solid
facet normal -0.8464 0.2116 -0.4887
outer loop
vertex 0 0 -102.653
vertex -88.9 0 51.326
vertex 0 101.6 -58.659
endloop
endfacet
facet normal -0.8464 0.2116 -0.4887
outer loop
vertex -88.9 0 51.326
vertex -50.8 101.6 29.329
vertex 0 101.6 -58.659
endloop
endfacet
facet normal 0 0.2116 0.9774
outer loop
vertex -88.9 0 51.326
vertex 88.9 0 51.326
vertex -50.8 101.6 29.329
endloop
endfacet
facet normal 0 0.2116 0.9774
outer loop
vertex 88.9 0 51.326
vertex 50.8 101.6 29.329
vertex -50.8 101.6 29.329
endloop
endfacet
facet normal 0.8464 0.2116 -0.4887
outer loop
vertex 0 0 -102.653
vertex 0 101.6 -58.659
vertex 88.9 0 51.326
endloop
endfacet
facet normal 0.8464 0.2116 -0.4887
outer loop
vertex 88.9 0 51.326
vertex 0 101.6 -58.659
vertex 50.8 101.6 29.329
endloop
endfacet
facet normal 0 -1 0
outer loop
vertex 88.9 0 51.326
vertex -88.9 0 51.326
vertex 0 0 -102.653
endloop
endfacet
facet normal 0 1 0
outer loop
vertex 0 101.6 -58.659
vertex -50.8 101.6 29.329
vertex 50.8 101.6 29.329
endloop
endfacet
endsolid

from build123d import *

# Parameters (mm, degrees)
BOSS_EXTRUDE1_DEPTH = 101.6
SKETCH3_W           = 415.71343084
SKETCH3_H           = 232.25163297
CUT_EXTRUDE1_DEPTH  = 152.4
SKETCH4_W           = 330.261627224
SKETCH4_H           = 257.519114475
CUT_EXTRUDE2_DEPTH  = 152.4
SKETCH5_W           = 304.13342749
SKETCH5_H           = 210.120003228
CUT_EXTRUDE3_DEPTH  = 152.4


with BuildPart() as part:
    # Sketch1 → Boss-Extrude1 (new body)
    with BuildSketch(Plane(origin=(0, 0, 0), x_dir=(1, 0, 0), z_dir=(0, 1, 0))):
        Polygon((0, 102.652877862), (-88.9, -51.326438931), (88.9, -51.326438931), align=None)
    extrude(amount=BOSS_EXTRUDE1_DEPTH)

    # Sketch3 → Cut-Extrude1 (cut)
    with BuildSketch(Plane(origin=(-42.459701493, 10.614925373, -24.514120086), x_dir=(0.4832445480711858, -0.0803381317273392, -0.8717915412241828), z_dir=(0.846414739030318, -0.2116036847575797, 0.4886777774252209))):
        with Locations((15.518535429, 25.810339784)):
            Rectangle(SKETCH3_W, SKETCH3_H)
    extrude(amount=-CUT_EXTRUDE1_DEPTH, mode=Mode.SUBTRACT)

    # Sketch4 → Cut-Extrude2 (cut)
    with BuildSketch(Plane(origin=(0, 10.614925373, 49.028240173), x_dir=(-1, 0, 0), z_dir=(0, -0.2116036847575795, -0.9773555548504419))):
        with Locations((6.792319927, 42.566259276)):
            Rectangle(SKETCH4_W, SKETCH4_H)
    extrude(amount=-CUT_EXTRUDE2_DEPTH, mode=Mode.SUBTRACT)

    # Sketch5 → Cut-Extrude3 (cut)
    with BuildSketch(Plane(origin=(42.459701493, 10.614925373, -24.514120086), x_dir=(0.4832445480711859, 0.08033813172733906, 0.8717915412241828), z_dir=(-0.8464147390303179, -0.21160368475757932, 0.4886777774252209))):
        with Locations((15.433156883, 49.391097897)):
            Rectangle(SKETCH5_W, SKETCH5_H)
    extrude(amount=-CUT_EXTRUDE3_DEPTH, mode=Mode.SUBTRACT)


solid = part.part
